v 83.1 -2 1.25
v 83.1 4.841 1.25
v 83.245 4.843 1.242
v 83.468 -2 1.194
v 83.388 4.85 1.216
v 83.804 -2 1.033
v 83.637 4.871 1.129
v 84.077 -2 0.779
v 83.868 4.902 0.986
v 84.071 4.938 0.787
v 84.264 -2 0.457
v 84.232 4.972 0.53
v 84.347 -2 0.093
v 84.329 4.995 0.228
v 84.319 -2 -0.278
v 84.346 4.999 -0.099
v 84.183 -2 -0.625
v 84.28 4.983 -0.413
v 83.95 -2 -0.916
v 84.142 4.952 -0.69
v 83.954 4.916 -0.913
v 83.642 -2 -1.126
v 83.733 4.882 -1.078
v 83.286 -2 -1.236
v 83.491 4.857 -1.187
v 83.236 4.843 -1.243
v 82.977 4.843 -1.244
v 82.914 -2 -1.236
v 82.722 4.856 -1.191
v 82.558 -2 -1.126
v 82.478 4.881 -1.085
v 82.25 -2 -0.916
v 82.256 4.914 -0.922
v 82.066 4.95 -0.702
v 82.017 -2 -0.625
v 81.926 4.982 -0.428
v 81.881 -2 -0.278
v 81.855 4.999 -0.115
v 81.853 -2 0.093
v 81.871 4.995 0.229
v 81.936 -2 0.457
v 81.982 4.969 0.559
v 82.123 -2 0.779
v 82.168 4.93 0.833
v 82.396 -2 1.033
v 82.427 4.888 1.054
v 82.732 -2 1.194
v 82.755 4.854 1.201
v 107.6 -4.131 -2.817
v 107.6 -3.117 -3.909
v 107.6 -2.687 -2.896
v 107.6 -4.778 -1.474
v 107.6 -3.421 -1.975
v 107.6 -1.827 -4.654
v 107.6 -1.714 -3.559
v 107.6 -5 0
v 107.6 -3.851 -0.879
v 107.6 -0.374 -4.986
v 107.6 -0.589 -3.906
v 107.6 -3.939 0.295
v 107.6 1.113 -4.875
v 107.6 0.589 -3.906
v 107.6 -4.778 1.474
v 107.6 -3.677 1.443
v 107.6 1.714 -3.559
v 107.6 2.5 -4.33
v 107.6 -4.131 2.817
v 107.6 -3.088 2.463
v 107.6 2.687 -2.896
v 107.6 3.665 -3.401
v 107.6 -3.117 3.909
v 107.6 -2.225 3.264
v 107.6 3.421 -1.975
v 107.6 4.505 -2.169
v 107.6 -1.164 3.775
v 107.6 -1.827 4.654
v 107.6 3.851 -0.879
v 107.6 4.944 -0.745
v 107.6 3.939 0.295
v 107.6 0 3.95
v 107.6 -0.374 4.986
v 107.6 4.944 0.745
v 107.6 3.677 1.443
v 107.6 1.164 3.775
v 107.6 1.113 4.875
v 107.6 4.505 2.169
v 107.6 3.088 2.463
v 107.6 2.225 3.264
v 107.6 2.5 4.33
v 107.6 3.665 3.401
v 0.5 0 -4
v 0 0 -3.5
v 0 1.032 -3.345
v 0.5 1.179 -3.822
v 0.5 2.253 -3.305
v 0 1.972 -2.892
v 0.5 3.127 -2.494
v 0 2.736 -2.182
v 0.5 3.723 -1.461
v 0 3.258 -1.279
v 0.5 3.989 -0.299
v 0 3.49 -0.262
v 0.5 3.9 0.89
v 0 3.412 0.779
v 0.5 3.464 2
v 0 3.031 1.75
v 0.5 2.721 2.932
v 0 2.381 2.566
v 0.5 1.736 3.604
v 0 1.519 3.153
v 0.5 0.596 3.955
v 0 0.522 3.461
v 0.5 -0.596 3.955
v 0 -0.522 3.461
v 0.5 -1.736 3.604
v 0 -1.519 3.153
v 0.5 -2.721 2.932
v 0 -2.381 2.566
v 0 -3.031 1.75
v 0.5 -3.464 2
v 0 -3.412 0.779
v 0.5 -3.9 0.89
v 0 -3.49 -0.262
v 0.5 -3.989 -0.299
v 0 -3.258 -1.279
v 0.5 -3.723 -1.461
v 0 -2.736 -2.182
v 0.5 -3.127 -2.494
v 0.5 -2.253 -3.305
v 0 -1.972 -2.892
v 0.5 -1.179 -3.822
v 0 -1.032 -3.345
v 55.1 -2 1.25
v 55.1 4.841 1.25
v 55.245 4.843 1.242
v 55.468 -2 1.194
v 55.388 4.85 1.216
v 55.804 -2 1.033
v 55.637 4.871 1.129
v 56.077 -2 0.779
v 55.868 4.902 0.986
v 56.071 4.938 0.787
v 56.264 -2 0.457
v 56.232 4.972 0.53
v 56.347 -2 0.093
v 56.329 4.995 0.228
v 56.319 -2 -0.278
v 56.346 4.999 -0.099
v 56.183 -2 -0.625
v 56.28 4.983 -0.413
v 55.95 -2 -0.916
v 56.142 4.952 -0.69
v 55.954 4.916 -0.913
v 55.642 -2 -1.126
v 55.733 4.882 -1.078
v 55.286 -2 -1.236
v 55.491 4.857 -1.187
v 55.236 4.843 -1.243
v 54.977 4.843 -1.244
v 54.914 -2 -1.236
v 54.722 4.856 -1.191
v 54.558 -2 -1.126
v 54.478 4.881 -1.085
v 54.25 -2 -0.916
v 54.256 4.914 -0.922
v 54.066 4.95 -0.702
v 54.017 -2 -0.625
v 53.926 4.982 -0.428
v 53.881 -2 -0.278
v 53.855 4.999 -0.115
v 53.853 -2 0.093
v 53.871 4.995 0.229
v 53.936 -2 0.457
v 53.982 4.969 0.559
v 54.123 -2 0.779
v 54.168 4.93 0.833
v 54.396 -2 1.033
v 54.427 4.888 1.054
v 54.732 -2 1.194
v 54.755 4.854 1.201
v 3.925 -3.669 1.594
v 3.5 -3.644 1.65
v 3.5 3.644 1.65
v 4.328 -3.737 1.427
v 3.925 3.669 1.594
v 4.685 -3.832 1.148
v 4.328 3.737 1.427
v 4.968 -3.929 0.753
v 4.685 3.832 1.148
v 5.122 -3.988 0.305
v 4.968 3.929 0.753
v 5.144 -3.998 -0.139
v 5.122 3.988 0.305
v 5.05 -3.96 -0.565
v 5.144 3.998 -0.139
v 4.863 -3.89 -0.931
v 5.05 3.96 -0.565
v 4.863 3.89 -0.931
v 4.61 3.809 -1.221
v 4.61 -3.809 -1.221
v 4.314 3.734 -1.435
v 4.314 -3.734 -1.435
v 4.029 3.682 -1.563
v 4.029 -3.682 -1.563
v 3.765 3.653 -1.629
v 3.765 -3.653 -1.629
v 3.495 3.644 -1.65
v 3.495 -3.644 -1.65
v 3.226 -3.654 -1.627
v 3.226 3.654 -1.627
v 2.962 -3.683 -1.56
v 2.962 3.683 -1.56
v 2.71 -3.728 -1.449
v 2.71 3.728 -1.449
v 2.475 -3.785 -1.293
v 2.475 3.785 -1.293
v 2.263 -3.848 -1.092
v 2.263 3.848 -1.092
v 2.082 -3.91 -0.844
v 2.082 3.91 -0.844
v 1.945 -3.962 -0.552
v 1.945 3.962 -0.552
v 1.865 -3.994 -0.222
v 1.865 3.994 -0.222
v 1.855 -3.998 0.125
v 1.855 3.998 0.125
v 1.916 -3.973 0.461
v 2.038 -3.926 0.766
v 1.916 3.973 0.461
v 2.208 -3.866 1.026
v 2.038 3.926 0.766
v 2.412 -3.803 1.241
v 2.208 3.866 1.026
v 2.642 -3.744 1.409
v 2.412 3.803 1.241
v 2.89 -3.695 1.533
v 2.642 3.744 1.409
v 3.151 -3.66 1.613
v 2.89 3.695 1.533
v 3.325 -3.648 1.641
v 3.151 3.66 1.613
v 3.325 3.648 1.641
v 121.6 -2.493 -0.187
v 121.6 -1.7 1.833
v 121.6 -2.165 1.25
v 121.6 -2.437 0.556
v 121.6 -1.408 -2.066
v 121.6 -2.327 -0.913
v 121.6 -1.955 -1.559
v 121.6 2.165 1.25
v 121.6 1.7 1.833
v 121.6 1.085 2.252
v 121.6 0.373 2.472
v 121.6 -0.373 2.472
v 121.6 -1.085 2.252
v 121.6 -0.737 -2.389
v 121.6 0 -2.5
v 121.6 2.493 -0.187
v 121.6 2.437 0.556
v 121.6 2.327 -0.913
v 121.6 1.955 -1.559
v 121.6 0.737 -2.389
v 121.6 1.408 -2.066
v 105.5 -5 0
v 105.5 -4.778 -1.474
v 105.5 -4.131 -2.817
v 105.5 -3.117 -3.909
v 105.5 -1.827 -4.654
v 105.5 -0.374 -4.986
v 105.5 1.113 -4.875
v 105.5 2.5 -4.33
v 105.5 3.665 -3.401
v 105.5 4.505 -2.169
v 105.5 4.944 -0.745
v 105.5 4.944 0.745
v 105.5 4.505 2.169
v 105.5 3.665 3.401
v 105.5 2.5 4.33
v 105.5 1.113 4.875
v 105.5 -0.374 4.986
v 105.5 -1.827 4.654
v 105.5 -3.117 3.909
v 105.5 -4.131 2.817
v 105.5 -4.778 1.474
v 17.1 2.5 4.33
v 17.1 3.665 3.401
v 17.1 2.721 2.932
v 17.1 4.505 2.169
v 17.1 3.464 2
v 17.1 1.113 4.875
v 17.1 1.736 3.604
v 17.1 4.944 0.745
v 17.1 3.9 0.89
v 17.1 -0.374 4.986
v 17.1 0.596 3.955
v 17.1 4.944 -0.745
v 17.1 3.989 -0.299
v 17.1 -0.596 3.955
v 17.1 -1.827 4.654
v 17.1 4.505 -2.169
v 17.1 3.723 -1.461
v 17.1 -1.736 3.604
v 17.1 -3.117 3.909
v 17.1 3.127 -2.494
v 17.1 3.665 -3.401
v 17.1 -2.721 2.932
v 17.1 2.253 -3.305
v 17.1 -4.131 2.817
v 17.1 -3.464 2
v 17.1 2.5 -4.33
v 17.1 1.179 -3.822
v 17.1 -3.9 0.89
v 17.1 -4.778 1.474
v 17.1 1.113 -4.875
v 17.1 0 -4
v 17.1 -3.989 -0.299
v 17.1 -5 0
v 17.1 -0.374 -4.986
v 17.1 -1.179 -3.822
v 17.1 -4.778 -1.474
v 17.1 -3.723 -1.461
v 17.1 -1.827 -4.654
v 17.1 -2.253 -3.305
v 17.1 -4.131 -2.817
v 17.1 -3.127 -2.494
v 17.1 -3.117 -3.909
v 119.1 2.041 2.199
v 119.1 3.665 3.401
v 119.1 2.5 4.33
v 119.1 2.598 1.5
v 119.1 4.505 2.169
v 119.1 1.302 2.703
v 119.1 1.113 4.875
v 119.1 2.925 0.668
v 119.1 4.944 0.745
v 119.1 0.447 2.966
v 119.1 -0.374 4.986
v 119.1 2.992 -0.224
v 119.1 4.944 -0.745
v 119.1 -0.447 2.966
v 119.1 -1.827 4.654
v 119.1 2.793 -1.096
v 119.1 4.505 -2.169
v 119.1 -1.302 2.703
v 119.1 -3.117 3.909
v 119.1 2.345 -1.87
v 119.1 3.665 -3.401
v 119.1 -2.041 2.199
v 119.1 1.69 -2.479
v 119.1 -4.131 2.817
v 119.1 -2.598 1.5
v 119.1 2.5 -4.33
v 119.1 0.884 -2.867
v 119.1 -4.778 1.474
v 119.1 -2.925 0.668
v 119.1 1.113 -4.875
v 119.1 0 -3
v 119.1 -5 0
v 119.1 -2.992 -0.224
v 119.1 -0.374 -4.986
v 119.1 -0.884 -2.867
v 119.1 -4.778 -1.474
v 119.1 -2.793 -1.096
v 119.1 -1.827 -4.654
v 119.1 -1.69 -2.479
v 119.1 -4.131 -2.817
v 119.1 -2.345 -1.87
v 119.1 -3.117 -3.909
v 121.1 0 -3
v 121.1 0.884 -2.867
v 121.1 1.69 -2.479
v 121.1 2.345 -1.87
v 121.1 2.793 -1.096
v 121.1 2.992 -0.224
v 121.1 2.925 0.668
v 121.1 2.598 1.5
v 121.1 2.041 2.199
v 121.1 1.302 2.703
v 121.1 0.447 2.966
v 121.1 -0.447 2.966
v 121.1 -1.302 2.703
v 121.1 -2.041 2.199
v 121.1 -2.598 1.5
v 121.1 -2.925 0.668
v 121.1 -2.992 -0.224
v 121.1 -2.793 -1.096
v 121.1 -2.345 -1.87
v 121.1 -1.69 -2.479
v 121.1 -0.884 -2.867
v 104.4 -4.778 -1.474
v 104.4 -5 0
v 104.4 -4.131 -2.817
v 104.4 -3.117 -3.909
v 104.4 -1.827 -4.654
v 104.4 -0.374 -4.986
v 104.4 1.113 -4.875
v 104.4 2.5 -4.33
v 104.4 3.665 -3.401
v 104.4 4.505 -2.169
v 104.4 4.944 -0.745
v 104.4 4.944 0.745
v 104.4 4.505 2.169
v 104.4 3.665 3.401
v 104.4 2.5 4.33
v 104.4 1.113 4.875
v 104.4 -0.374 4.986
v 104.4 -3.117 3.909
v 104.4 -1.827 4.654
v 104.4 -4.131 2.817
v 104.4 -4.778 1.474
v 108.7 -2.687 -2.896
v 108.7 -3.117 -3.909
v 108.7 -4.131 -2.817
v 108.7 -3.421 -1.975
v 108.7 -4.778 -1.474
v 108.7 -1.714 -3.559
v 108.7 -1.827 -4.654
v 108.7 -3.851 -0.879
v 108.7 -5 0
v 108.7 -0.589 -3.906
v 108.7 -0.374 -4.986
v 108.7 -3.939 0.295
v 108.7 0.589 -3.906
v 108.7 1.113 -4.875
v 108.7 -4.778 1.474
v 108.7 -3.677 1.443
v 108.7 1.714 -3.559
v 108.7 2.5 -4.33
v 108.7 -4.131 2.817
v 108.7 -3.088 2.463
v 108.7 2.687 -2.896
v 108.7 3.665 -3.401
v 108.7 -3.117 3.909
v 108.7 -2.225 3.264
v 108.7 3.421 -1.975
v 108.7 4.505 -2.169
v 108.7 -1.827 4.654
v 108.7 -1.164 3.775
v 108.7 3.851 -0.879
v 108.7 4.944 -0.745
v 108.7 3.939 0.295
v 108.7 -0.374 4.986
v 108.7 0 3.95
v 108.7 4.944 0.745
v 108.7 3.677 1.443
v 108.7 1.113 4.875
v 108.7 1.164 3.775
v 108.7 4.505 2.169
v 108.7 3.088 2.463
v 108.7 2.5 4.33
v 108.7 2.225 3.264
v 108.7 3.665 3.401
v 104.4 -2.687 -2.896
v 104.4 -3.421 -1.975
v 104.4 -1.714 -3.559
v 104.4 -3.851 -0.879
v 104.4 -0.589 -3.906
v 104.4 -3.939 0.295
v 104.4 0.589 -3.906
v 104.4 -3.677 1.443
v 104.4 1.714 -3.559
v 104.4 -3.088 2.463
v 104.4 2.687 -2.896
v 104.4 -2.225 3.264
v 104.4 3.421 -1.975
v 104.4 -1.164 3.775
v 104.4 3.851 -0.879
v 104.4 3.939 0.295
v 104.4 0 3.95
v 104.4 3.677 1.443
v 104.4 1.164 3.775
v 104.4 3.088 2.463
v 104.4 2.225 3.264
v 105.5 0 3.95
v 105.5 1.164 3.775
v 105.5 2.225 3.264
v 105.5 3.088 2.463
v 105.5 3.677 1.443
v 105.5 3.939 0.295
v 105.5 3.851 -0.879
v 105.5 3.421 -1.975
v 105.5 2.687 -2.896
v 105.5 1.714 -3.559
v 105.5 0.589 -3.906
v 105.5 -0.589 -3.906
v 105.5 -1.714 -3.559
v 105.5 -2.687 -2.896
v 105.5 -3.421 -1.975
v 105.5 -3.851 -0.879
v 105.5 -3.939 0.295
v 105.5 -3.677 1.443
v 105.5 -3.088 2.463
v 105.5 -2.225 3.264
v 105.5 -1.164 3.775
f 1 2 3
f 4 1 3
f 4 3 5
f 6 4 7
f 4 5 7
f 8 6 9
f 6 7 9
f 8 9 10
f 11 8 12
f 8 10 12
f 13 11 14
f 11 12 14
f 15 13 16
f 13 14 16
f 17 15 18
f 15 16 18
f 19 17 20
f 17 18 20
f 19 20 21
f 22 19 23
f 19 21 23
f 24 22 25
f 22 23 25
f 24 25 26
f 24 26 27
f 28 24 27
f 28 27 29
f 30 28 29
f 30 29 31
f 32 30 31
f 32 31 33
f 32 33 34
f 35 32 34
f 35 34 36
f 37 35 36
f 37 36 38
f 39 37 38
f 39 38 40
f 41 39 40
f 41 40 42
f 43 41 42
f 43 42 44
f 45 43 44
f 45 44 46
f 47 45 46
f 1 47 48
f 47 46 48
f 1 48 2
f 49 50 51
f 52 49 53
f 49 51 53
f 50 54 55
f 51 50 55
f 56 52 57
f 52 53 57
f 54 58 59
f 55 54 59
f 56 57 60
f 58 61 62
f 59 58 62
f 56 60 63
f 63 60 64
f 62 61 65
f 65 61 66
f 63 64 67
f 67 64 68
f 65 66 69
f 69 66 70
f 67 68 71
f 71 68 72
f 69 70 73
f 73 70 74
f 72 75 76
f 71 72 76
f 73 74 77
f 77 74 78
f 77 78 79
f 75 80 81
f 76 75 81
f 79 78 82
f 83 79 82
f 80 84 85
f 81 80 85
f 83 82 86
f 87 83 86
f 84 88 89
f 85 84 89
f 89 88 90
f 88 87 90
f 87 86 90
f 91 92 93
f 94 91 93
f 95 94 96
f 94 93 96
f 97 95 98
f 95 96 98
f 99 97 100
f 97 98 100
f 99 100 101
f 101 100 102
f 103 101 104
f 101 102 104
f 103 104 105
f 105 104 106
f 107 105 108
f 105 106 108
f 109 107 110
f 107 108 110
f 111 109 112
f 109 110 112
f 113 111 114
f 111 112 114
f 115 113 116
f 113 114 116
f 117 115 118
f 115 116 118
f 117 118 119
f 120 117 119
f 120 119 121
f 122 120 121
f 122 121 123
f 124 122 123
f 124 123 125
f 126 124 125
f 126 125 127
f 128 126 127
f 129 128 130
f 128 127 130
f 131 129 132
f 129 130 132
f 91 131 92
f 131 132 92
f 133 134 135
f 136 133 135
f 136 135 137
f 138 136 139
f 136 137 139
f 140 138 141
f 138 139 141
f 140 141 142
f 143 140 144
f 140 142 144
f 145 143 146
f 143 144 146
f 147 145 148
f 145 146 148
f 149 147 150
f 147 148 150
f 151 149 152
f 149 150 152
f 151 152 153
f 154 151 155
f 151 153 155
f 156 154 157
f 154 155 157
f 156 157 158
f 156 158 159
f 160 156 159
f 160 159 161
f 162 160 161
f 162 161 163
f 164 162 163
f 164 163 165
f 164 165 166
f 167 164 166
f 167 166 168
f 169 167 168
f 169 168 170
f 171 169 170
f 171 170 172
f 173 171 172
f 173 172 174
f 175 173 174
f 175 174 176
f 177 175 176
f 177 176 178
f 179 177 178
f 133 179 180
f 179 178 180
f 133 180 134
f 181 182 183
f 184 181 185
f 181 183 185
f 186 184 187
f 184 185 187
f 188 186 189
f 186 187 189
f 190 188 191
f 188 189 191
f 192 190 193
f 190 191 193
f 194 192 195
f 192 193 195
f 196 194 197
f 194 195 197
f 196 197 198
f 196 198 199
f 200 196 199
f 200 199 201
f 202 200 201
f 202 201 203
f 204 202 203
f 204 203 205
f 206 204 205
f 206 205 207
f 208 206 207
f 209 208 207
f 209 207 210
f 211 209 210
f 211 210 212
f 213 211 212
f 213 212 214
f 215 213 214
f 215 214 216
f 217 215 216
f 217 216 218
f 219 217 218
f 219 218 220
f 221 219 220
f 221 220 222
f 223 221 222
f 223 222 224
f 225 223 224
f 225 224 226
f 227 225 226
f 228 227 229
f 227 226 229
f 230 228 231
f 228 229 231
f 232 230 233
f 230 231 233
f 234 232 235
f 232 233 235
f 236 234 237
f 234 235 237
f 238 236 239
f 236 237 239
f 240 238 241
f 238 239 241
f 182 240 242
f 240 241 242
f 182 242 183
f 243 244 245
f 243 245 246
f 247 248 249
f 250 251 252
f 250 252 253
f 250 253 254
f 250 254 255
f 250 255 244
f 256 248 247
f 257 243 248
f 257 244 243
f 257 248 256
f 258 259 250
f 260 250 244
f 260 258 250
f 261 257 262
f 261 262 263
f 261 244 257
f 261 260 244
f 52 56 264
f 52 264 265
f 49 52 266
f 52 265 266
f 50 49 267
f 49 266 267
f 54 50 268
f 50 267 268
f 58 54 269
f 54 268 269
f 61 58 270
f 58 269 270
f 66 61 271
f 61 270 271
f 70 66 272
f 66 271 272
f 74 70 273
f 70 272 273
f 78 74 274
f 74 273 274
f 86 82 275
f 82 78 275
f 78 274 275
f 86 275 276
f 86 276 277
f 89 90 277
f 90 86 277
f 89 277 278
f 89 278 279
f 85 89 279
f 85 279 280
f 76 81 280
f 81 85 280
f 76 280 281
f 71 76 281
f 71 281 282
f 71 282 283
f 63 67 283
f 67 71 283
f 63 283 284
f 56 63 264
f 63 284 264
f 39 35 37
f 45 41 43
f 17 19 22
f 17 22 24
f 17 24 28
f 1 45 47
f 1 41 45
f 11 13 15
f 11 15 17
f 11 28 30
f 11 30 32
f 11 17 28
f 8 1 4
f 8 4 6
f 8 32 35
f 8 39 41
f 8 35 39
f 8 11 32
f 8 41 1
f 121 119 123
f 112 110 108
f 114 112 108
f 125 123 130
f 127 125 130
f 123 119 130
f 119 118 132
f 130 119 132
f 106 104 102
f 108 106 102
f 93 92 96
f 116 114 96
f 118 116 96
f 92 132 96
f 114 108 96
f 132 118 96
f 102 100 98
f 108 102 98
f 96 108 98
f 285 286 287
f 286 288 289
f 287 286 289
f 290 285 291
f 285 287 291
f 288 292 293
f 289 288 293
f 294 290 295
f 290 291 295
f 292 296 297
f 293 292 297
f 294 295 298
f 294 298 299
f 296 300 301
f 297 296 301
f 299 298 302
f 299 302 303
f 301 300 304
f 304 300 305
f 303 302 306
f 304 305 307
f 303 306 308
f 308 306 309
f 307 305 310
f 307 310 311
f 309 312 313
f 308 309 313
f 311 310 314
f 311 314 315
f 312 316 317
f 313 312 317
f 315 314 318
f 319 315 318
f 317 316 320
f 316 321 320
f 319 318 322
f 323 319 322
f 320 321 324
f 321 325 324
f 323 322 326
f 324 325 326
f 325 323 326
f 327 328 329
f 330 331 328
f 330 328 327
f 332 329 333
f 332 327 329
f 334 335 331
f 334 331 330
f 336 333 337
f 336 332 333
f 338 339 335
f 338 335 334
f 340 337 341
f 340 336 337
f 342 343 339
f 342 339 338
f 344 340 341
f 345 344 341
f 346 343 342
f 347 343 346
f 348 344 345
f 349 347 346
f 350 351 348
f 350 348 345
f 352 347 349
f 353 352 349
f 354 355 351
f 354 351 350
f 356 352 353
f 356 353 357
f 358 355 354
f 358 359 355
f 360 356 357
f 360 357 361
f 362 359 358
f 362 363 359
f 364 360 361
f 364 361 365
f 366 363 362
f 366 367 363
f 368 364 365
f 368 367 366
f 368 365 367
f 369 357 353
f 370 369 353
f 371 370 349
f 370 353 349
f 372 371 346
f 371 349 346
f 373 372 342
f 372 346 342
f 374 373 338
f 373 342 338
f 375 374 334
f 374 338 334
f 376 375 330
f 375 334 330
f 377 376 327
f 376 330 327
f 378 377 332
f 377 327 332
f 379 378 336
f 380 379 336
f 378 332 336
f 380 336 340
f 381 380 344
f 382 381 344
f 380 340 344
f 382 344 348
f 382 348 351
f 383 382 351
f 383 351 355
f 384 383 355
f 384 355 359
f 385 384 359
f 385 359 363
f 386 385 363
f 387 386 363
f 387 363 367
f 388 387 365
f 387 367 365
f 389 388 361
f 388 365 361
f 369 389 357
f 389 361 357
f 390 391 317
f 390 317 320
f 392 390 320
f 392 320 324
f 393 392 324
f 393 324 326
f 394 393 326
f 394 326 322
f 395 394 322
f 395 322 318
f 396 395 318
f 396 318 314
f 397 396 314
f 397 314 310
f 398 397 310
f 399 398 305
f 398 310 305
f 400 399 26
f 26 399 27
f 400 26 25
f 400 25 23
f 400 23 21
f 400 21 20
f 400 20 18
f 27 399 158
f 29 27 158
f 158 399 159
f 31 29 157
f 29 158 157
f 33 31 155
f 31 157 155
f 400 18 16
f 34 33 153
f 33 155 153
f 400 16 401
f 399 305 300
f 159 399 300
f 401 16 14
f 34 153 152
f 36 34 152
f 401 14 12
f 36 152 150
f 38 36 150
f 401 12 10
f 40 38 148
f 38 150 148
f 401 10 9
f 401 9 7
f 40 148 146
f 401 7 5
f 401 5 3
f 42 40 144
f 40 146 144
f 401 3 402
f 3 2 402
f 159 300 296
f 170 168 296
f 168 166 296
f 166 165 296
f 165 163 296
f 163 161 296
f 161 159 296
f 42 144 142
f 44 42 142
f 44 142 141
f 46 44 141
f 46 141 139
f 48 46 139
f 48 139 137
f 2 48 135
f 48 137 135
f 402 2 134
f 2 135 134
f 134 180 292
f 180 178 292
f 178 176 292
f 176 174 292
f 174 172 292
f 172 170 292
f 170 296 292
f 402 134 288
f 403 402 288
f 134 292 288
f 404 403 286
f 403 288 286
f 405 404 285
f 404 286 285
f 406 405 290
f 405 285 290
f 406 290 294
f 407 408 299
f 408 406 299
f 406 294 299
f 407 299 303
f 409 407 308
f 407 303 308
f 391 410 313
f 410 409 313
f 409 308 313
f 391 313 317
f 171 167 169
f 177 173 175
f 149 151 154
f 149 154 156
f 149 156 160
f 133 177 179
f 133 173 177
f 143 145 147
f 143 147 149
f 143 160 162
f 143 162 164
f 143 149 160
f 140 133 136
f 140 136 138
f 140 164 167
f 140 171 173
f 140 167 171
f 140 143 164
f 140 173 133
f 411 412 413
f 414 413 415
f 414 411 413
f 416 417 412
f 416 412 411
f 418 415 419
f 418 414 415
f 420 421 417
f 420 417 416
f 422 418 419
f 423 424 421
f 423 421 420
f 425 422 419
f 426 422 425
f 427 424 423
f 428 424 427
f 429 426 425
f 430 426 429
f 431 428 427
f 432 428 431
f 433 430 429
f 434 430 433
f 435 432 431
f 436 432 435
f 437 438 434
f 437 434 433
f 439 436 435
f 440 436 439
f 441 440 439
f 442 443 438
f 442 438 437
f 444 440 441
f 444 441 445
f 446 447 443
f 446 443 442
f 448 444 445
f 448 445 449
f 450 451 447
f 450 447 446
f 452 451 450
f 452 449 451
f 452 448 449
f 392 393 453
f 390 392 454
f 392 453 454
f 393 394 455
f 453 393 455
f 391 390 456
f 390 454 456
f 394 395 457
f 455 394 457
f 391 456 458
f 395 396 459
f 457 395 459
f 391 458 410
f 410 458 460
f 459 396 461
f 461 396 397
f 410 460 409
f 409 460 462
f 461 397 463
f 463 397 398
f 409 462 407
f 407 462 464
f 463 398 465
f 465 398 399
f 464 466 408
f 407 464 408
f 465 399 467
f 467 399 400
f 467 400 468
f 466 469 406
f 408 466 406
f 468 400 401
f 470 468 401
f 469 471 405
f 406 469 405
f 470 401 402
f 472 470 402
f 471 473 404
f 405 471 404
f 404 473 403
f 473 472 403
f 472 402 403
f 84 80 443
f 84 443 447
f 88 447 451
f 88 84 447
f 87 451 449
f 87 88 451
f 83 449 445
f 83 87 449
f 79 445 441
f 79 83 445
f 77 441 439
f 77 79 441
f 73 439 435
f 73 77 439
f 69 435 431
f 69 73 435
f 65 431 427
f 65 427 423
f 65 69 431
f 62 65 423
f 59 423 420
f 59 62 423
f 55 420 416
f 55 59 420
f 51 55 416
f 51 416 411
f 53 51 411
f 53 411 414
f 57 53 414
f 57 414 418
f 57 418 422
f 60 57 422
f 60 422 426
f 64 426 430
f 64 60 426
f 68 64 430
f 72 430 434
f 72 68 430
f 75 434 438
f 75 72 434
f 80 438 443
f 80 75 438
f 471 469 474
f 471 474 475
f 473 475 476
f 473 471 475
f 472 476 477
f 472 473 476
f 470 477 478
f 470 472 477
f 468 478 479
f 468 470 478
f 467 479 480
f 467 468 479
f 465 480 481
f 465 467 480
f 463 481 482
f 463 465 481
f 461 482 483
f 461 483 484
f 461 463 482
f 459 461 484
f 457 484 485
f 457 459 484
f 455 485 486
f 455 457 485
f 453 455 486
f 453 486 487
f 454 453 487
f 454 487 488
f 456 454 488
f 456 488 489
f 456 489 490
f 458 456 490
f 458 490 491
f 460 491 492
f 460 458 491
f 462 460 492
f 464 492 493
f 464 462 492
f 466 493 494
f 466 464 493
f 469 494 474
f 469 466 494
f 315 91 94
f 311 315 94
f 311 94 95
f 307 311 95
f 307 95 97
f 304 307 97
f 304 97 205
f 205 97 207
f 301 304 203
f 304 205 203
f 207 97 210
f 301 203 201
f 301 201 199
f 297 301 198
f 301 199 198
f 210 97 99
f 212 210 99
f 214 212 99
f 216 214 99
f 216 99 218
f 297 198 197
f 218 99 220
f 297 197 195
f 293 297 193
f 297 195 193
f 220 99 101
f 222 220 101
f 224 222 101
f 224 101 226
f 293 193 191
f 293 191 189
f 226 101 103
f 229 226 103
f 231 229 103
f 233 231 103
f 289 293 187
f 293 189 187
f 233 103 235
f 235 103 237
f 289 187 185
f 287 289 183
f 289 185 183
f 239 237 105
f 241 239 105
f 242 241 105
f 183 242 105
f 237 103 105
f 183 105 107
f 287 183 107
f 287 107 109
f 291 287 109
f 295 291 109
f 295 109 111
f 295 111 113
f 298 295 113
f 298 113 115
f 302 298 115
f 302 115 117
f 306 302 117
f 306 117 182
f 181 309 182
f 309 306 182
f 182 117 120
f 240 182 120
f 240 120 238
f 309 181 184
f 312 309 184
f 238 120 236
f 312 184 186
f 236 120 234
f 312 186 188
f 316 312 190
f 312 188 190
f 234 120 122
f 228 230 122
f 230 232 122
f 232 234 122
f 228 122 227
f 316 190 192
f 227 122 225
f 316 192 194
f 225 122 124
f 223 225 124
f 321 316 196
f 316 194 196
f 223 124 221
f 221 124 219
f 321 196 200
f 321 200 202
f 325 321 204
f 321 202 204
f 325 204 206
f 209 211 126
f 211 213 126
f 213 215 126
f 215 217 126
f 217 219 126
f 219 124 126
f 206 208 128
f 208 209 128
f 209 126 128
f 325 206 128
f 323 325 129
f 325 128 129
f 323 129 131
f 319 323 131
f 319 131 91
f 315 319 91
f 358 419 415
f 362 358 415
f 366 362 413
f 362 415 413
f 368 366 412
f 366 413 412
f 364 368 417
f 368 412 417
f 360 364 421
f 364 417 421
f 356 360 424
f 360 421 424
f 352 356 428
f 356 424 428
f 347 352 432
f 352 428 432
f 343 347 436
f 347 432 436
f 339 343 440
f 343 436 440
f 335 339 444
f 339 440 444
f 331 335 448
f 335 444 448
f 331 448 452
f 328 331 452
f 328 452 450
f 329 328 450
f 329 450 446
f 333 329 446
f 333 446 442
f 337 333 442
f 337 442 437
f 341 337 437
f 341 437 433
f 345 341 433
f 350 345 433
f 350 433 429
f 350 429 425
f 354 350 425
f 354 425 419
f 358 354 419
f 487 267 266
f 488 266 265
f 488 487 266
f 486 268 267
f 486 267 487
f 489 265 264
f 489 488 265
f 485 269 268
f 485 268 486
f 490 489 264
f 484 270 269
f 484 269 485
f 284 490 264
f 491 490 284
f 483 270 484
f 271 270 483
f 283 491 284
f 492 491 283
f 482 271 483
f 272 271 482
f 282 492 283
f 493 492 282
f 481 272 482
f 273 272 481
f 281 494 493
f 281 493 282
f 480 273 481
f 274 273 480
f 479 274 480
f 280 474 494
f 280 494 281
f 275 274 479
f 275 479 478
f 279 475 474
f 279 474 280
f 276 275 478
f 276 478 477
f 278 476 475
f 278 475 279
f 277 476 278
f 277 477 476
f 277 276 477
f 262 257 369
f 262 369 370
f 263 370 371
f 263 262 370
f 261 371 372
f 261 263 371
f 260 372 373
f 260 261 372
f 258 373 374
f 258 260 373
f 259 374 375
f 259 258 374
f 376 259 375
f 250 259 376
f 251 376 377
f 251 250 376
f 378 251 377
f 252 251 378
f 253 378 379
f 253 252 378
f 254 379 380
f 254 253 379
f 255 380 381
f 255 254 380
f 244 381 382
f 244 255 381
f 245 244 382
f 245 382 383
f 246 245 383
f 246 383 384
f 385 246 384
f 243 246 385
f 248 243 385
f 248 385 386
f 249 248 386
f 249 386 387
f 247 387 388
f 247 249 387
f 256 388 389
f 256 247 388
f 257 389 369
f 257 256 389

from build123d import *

# Parameters (mm, degrees)
SKETCH_1_R          = 4
EXTRUDE_1_DEPTH     = 17.1
SKETCH_2_R          = 5
EXTRUDE_2_DEPTH     = 102
SKETCH_3_R          = 1.65
CUT_EXTRUDE_1_DEPTH = 20
CUT_EXTRUDE_START   = -6.8
SKETCH_7_R          = 5
SKETCH_7_R_2        = 3.95
CUT_EXTRUDE_4_DEPTH = 1.1
SKETCH_8_R          = 3
EXTRUDE_3_DEPTH     = 2.5
CHAMFER_1_SIZE      = 0.5
SKETCH_9_R          = 1.25
CUT_EXTRUDE_5_DEPTH = 7
CUT_EXTRUDE_START_2 = -10
SKETCH_7_2_R        = 5
SKETCH_7_2_R_2      = 3.95
CUT_EXTRUDE_6_DEPTH = 1.1


with BuildPart() as part:
    # 草图1 → 凸台-拉伸1 (new body)
    with BuildSketch(Plane(origin=(0, 0, 0), x_dir=(0, 0, -1), z_dir=(1, 0, 0))):
        Circle(SKETCH_1_R)
    extrude(amount=EXTRUDE_1_DEPTH)

    # 草图2 → 凸台-拉伸2 (add)
    with BuildSketch(Plane(origin=(17.1, 0, 0), x_dir=(0, 0, -1), z_dir=(1, 0, 0))):
        with Locations(Location((0, 0, 0), (0, 0, 270))):
            Circle(SKETCH_2_R)
    extrude(amount=EXTRUDE_2_DEPTH)

    # 草图3 → 切除-拉伸1 (cut)
    with BuildSketch(Plane(origin=(0, 7, 0), x_dir=(1, 0, 0), z_dir=(0, 1, 0))):
        with Locations(Location((3.5, 0, 0), (0, 0, 270))):
            Circle(SKETCH_3_R)
    extrude(amount=-CUT_EXTRUDE_1_DEPTH, mode=Mode.SUBTRACT)

    # 草图7 → 切除-拉伸4 (cut)
    with BuildSketch(Plane.ZY.offset(-97.6).offset(CUT_EXTRUDE_START)):
        Circle(SKETCH_7_R)
        Circle(SKETCH_7_R_2, mode=Mode.SUBTRACT)
    extrude(amount=-CUT_EXTRUDE_4_DEPTH, mode=Mode.SUBTRACT)

    # 草图8 → 凸台-拉伸3 (add)
    with BuildSketch(Plane(origin=(119.1, 0, 0), x_dir=(0, 0, -1), z_dir=(1, 0, 0))):
        Circle(SKETCH_8_R)
    extrude(amount=EXTRUDE_3_DEPTH)

    # 倒角1
    chamfer_1_edges = [part.edges().sort_by_distance(p)[0] for p in [
        (0, 0, 4),
        (121.6, 0, 3),
    ]]
    chamfer(chamfer_1_edges, length=CHAMFER_1_SIZE)

    # 草图9 → 切除-拉伸5 (cut)
    with BuildSketch(Plane(origin=(0, 5, 0), x_dir=(1, 0, 0), z_dir=(0, 1, 0))):
        with Locations(Location((83.1, 0, 0), (0, 0, 270))):
            Circle(SKETCH_9_R)
        with Locations(Location((55.1, 0, 0), (0, 0, 270))):
            Circle(SKETCH_9_R)
    extrude(amount=-CUT_EXTRUDE_5_DEPTH, mode=Mode.SUBTRACT)

    # 草图7<2> → 切除-拉伸6 (cut)
    with BuildSketch(Plane.ZY.offset(-97.6).offset(CUT_EXTRUDE_START_2)):
        Circle(SKETCH_7_2_R)
        Circle(SKETCH_7_2_R_2, mode=Mode.SUBTRACT)
    extrude(amount=-CUT_EXTRUDE_6_DEPTH, mode=Mode.SUBTRACT)


solid = part.part
